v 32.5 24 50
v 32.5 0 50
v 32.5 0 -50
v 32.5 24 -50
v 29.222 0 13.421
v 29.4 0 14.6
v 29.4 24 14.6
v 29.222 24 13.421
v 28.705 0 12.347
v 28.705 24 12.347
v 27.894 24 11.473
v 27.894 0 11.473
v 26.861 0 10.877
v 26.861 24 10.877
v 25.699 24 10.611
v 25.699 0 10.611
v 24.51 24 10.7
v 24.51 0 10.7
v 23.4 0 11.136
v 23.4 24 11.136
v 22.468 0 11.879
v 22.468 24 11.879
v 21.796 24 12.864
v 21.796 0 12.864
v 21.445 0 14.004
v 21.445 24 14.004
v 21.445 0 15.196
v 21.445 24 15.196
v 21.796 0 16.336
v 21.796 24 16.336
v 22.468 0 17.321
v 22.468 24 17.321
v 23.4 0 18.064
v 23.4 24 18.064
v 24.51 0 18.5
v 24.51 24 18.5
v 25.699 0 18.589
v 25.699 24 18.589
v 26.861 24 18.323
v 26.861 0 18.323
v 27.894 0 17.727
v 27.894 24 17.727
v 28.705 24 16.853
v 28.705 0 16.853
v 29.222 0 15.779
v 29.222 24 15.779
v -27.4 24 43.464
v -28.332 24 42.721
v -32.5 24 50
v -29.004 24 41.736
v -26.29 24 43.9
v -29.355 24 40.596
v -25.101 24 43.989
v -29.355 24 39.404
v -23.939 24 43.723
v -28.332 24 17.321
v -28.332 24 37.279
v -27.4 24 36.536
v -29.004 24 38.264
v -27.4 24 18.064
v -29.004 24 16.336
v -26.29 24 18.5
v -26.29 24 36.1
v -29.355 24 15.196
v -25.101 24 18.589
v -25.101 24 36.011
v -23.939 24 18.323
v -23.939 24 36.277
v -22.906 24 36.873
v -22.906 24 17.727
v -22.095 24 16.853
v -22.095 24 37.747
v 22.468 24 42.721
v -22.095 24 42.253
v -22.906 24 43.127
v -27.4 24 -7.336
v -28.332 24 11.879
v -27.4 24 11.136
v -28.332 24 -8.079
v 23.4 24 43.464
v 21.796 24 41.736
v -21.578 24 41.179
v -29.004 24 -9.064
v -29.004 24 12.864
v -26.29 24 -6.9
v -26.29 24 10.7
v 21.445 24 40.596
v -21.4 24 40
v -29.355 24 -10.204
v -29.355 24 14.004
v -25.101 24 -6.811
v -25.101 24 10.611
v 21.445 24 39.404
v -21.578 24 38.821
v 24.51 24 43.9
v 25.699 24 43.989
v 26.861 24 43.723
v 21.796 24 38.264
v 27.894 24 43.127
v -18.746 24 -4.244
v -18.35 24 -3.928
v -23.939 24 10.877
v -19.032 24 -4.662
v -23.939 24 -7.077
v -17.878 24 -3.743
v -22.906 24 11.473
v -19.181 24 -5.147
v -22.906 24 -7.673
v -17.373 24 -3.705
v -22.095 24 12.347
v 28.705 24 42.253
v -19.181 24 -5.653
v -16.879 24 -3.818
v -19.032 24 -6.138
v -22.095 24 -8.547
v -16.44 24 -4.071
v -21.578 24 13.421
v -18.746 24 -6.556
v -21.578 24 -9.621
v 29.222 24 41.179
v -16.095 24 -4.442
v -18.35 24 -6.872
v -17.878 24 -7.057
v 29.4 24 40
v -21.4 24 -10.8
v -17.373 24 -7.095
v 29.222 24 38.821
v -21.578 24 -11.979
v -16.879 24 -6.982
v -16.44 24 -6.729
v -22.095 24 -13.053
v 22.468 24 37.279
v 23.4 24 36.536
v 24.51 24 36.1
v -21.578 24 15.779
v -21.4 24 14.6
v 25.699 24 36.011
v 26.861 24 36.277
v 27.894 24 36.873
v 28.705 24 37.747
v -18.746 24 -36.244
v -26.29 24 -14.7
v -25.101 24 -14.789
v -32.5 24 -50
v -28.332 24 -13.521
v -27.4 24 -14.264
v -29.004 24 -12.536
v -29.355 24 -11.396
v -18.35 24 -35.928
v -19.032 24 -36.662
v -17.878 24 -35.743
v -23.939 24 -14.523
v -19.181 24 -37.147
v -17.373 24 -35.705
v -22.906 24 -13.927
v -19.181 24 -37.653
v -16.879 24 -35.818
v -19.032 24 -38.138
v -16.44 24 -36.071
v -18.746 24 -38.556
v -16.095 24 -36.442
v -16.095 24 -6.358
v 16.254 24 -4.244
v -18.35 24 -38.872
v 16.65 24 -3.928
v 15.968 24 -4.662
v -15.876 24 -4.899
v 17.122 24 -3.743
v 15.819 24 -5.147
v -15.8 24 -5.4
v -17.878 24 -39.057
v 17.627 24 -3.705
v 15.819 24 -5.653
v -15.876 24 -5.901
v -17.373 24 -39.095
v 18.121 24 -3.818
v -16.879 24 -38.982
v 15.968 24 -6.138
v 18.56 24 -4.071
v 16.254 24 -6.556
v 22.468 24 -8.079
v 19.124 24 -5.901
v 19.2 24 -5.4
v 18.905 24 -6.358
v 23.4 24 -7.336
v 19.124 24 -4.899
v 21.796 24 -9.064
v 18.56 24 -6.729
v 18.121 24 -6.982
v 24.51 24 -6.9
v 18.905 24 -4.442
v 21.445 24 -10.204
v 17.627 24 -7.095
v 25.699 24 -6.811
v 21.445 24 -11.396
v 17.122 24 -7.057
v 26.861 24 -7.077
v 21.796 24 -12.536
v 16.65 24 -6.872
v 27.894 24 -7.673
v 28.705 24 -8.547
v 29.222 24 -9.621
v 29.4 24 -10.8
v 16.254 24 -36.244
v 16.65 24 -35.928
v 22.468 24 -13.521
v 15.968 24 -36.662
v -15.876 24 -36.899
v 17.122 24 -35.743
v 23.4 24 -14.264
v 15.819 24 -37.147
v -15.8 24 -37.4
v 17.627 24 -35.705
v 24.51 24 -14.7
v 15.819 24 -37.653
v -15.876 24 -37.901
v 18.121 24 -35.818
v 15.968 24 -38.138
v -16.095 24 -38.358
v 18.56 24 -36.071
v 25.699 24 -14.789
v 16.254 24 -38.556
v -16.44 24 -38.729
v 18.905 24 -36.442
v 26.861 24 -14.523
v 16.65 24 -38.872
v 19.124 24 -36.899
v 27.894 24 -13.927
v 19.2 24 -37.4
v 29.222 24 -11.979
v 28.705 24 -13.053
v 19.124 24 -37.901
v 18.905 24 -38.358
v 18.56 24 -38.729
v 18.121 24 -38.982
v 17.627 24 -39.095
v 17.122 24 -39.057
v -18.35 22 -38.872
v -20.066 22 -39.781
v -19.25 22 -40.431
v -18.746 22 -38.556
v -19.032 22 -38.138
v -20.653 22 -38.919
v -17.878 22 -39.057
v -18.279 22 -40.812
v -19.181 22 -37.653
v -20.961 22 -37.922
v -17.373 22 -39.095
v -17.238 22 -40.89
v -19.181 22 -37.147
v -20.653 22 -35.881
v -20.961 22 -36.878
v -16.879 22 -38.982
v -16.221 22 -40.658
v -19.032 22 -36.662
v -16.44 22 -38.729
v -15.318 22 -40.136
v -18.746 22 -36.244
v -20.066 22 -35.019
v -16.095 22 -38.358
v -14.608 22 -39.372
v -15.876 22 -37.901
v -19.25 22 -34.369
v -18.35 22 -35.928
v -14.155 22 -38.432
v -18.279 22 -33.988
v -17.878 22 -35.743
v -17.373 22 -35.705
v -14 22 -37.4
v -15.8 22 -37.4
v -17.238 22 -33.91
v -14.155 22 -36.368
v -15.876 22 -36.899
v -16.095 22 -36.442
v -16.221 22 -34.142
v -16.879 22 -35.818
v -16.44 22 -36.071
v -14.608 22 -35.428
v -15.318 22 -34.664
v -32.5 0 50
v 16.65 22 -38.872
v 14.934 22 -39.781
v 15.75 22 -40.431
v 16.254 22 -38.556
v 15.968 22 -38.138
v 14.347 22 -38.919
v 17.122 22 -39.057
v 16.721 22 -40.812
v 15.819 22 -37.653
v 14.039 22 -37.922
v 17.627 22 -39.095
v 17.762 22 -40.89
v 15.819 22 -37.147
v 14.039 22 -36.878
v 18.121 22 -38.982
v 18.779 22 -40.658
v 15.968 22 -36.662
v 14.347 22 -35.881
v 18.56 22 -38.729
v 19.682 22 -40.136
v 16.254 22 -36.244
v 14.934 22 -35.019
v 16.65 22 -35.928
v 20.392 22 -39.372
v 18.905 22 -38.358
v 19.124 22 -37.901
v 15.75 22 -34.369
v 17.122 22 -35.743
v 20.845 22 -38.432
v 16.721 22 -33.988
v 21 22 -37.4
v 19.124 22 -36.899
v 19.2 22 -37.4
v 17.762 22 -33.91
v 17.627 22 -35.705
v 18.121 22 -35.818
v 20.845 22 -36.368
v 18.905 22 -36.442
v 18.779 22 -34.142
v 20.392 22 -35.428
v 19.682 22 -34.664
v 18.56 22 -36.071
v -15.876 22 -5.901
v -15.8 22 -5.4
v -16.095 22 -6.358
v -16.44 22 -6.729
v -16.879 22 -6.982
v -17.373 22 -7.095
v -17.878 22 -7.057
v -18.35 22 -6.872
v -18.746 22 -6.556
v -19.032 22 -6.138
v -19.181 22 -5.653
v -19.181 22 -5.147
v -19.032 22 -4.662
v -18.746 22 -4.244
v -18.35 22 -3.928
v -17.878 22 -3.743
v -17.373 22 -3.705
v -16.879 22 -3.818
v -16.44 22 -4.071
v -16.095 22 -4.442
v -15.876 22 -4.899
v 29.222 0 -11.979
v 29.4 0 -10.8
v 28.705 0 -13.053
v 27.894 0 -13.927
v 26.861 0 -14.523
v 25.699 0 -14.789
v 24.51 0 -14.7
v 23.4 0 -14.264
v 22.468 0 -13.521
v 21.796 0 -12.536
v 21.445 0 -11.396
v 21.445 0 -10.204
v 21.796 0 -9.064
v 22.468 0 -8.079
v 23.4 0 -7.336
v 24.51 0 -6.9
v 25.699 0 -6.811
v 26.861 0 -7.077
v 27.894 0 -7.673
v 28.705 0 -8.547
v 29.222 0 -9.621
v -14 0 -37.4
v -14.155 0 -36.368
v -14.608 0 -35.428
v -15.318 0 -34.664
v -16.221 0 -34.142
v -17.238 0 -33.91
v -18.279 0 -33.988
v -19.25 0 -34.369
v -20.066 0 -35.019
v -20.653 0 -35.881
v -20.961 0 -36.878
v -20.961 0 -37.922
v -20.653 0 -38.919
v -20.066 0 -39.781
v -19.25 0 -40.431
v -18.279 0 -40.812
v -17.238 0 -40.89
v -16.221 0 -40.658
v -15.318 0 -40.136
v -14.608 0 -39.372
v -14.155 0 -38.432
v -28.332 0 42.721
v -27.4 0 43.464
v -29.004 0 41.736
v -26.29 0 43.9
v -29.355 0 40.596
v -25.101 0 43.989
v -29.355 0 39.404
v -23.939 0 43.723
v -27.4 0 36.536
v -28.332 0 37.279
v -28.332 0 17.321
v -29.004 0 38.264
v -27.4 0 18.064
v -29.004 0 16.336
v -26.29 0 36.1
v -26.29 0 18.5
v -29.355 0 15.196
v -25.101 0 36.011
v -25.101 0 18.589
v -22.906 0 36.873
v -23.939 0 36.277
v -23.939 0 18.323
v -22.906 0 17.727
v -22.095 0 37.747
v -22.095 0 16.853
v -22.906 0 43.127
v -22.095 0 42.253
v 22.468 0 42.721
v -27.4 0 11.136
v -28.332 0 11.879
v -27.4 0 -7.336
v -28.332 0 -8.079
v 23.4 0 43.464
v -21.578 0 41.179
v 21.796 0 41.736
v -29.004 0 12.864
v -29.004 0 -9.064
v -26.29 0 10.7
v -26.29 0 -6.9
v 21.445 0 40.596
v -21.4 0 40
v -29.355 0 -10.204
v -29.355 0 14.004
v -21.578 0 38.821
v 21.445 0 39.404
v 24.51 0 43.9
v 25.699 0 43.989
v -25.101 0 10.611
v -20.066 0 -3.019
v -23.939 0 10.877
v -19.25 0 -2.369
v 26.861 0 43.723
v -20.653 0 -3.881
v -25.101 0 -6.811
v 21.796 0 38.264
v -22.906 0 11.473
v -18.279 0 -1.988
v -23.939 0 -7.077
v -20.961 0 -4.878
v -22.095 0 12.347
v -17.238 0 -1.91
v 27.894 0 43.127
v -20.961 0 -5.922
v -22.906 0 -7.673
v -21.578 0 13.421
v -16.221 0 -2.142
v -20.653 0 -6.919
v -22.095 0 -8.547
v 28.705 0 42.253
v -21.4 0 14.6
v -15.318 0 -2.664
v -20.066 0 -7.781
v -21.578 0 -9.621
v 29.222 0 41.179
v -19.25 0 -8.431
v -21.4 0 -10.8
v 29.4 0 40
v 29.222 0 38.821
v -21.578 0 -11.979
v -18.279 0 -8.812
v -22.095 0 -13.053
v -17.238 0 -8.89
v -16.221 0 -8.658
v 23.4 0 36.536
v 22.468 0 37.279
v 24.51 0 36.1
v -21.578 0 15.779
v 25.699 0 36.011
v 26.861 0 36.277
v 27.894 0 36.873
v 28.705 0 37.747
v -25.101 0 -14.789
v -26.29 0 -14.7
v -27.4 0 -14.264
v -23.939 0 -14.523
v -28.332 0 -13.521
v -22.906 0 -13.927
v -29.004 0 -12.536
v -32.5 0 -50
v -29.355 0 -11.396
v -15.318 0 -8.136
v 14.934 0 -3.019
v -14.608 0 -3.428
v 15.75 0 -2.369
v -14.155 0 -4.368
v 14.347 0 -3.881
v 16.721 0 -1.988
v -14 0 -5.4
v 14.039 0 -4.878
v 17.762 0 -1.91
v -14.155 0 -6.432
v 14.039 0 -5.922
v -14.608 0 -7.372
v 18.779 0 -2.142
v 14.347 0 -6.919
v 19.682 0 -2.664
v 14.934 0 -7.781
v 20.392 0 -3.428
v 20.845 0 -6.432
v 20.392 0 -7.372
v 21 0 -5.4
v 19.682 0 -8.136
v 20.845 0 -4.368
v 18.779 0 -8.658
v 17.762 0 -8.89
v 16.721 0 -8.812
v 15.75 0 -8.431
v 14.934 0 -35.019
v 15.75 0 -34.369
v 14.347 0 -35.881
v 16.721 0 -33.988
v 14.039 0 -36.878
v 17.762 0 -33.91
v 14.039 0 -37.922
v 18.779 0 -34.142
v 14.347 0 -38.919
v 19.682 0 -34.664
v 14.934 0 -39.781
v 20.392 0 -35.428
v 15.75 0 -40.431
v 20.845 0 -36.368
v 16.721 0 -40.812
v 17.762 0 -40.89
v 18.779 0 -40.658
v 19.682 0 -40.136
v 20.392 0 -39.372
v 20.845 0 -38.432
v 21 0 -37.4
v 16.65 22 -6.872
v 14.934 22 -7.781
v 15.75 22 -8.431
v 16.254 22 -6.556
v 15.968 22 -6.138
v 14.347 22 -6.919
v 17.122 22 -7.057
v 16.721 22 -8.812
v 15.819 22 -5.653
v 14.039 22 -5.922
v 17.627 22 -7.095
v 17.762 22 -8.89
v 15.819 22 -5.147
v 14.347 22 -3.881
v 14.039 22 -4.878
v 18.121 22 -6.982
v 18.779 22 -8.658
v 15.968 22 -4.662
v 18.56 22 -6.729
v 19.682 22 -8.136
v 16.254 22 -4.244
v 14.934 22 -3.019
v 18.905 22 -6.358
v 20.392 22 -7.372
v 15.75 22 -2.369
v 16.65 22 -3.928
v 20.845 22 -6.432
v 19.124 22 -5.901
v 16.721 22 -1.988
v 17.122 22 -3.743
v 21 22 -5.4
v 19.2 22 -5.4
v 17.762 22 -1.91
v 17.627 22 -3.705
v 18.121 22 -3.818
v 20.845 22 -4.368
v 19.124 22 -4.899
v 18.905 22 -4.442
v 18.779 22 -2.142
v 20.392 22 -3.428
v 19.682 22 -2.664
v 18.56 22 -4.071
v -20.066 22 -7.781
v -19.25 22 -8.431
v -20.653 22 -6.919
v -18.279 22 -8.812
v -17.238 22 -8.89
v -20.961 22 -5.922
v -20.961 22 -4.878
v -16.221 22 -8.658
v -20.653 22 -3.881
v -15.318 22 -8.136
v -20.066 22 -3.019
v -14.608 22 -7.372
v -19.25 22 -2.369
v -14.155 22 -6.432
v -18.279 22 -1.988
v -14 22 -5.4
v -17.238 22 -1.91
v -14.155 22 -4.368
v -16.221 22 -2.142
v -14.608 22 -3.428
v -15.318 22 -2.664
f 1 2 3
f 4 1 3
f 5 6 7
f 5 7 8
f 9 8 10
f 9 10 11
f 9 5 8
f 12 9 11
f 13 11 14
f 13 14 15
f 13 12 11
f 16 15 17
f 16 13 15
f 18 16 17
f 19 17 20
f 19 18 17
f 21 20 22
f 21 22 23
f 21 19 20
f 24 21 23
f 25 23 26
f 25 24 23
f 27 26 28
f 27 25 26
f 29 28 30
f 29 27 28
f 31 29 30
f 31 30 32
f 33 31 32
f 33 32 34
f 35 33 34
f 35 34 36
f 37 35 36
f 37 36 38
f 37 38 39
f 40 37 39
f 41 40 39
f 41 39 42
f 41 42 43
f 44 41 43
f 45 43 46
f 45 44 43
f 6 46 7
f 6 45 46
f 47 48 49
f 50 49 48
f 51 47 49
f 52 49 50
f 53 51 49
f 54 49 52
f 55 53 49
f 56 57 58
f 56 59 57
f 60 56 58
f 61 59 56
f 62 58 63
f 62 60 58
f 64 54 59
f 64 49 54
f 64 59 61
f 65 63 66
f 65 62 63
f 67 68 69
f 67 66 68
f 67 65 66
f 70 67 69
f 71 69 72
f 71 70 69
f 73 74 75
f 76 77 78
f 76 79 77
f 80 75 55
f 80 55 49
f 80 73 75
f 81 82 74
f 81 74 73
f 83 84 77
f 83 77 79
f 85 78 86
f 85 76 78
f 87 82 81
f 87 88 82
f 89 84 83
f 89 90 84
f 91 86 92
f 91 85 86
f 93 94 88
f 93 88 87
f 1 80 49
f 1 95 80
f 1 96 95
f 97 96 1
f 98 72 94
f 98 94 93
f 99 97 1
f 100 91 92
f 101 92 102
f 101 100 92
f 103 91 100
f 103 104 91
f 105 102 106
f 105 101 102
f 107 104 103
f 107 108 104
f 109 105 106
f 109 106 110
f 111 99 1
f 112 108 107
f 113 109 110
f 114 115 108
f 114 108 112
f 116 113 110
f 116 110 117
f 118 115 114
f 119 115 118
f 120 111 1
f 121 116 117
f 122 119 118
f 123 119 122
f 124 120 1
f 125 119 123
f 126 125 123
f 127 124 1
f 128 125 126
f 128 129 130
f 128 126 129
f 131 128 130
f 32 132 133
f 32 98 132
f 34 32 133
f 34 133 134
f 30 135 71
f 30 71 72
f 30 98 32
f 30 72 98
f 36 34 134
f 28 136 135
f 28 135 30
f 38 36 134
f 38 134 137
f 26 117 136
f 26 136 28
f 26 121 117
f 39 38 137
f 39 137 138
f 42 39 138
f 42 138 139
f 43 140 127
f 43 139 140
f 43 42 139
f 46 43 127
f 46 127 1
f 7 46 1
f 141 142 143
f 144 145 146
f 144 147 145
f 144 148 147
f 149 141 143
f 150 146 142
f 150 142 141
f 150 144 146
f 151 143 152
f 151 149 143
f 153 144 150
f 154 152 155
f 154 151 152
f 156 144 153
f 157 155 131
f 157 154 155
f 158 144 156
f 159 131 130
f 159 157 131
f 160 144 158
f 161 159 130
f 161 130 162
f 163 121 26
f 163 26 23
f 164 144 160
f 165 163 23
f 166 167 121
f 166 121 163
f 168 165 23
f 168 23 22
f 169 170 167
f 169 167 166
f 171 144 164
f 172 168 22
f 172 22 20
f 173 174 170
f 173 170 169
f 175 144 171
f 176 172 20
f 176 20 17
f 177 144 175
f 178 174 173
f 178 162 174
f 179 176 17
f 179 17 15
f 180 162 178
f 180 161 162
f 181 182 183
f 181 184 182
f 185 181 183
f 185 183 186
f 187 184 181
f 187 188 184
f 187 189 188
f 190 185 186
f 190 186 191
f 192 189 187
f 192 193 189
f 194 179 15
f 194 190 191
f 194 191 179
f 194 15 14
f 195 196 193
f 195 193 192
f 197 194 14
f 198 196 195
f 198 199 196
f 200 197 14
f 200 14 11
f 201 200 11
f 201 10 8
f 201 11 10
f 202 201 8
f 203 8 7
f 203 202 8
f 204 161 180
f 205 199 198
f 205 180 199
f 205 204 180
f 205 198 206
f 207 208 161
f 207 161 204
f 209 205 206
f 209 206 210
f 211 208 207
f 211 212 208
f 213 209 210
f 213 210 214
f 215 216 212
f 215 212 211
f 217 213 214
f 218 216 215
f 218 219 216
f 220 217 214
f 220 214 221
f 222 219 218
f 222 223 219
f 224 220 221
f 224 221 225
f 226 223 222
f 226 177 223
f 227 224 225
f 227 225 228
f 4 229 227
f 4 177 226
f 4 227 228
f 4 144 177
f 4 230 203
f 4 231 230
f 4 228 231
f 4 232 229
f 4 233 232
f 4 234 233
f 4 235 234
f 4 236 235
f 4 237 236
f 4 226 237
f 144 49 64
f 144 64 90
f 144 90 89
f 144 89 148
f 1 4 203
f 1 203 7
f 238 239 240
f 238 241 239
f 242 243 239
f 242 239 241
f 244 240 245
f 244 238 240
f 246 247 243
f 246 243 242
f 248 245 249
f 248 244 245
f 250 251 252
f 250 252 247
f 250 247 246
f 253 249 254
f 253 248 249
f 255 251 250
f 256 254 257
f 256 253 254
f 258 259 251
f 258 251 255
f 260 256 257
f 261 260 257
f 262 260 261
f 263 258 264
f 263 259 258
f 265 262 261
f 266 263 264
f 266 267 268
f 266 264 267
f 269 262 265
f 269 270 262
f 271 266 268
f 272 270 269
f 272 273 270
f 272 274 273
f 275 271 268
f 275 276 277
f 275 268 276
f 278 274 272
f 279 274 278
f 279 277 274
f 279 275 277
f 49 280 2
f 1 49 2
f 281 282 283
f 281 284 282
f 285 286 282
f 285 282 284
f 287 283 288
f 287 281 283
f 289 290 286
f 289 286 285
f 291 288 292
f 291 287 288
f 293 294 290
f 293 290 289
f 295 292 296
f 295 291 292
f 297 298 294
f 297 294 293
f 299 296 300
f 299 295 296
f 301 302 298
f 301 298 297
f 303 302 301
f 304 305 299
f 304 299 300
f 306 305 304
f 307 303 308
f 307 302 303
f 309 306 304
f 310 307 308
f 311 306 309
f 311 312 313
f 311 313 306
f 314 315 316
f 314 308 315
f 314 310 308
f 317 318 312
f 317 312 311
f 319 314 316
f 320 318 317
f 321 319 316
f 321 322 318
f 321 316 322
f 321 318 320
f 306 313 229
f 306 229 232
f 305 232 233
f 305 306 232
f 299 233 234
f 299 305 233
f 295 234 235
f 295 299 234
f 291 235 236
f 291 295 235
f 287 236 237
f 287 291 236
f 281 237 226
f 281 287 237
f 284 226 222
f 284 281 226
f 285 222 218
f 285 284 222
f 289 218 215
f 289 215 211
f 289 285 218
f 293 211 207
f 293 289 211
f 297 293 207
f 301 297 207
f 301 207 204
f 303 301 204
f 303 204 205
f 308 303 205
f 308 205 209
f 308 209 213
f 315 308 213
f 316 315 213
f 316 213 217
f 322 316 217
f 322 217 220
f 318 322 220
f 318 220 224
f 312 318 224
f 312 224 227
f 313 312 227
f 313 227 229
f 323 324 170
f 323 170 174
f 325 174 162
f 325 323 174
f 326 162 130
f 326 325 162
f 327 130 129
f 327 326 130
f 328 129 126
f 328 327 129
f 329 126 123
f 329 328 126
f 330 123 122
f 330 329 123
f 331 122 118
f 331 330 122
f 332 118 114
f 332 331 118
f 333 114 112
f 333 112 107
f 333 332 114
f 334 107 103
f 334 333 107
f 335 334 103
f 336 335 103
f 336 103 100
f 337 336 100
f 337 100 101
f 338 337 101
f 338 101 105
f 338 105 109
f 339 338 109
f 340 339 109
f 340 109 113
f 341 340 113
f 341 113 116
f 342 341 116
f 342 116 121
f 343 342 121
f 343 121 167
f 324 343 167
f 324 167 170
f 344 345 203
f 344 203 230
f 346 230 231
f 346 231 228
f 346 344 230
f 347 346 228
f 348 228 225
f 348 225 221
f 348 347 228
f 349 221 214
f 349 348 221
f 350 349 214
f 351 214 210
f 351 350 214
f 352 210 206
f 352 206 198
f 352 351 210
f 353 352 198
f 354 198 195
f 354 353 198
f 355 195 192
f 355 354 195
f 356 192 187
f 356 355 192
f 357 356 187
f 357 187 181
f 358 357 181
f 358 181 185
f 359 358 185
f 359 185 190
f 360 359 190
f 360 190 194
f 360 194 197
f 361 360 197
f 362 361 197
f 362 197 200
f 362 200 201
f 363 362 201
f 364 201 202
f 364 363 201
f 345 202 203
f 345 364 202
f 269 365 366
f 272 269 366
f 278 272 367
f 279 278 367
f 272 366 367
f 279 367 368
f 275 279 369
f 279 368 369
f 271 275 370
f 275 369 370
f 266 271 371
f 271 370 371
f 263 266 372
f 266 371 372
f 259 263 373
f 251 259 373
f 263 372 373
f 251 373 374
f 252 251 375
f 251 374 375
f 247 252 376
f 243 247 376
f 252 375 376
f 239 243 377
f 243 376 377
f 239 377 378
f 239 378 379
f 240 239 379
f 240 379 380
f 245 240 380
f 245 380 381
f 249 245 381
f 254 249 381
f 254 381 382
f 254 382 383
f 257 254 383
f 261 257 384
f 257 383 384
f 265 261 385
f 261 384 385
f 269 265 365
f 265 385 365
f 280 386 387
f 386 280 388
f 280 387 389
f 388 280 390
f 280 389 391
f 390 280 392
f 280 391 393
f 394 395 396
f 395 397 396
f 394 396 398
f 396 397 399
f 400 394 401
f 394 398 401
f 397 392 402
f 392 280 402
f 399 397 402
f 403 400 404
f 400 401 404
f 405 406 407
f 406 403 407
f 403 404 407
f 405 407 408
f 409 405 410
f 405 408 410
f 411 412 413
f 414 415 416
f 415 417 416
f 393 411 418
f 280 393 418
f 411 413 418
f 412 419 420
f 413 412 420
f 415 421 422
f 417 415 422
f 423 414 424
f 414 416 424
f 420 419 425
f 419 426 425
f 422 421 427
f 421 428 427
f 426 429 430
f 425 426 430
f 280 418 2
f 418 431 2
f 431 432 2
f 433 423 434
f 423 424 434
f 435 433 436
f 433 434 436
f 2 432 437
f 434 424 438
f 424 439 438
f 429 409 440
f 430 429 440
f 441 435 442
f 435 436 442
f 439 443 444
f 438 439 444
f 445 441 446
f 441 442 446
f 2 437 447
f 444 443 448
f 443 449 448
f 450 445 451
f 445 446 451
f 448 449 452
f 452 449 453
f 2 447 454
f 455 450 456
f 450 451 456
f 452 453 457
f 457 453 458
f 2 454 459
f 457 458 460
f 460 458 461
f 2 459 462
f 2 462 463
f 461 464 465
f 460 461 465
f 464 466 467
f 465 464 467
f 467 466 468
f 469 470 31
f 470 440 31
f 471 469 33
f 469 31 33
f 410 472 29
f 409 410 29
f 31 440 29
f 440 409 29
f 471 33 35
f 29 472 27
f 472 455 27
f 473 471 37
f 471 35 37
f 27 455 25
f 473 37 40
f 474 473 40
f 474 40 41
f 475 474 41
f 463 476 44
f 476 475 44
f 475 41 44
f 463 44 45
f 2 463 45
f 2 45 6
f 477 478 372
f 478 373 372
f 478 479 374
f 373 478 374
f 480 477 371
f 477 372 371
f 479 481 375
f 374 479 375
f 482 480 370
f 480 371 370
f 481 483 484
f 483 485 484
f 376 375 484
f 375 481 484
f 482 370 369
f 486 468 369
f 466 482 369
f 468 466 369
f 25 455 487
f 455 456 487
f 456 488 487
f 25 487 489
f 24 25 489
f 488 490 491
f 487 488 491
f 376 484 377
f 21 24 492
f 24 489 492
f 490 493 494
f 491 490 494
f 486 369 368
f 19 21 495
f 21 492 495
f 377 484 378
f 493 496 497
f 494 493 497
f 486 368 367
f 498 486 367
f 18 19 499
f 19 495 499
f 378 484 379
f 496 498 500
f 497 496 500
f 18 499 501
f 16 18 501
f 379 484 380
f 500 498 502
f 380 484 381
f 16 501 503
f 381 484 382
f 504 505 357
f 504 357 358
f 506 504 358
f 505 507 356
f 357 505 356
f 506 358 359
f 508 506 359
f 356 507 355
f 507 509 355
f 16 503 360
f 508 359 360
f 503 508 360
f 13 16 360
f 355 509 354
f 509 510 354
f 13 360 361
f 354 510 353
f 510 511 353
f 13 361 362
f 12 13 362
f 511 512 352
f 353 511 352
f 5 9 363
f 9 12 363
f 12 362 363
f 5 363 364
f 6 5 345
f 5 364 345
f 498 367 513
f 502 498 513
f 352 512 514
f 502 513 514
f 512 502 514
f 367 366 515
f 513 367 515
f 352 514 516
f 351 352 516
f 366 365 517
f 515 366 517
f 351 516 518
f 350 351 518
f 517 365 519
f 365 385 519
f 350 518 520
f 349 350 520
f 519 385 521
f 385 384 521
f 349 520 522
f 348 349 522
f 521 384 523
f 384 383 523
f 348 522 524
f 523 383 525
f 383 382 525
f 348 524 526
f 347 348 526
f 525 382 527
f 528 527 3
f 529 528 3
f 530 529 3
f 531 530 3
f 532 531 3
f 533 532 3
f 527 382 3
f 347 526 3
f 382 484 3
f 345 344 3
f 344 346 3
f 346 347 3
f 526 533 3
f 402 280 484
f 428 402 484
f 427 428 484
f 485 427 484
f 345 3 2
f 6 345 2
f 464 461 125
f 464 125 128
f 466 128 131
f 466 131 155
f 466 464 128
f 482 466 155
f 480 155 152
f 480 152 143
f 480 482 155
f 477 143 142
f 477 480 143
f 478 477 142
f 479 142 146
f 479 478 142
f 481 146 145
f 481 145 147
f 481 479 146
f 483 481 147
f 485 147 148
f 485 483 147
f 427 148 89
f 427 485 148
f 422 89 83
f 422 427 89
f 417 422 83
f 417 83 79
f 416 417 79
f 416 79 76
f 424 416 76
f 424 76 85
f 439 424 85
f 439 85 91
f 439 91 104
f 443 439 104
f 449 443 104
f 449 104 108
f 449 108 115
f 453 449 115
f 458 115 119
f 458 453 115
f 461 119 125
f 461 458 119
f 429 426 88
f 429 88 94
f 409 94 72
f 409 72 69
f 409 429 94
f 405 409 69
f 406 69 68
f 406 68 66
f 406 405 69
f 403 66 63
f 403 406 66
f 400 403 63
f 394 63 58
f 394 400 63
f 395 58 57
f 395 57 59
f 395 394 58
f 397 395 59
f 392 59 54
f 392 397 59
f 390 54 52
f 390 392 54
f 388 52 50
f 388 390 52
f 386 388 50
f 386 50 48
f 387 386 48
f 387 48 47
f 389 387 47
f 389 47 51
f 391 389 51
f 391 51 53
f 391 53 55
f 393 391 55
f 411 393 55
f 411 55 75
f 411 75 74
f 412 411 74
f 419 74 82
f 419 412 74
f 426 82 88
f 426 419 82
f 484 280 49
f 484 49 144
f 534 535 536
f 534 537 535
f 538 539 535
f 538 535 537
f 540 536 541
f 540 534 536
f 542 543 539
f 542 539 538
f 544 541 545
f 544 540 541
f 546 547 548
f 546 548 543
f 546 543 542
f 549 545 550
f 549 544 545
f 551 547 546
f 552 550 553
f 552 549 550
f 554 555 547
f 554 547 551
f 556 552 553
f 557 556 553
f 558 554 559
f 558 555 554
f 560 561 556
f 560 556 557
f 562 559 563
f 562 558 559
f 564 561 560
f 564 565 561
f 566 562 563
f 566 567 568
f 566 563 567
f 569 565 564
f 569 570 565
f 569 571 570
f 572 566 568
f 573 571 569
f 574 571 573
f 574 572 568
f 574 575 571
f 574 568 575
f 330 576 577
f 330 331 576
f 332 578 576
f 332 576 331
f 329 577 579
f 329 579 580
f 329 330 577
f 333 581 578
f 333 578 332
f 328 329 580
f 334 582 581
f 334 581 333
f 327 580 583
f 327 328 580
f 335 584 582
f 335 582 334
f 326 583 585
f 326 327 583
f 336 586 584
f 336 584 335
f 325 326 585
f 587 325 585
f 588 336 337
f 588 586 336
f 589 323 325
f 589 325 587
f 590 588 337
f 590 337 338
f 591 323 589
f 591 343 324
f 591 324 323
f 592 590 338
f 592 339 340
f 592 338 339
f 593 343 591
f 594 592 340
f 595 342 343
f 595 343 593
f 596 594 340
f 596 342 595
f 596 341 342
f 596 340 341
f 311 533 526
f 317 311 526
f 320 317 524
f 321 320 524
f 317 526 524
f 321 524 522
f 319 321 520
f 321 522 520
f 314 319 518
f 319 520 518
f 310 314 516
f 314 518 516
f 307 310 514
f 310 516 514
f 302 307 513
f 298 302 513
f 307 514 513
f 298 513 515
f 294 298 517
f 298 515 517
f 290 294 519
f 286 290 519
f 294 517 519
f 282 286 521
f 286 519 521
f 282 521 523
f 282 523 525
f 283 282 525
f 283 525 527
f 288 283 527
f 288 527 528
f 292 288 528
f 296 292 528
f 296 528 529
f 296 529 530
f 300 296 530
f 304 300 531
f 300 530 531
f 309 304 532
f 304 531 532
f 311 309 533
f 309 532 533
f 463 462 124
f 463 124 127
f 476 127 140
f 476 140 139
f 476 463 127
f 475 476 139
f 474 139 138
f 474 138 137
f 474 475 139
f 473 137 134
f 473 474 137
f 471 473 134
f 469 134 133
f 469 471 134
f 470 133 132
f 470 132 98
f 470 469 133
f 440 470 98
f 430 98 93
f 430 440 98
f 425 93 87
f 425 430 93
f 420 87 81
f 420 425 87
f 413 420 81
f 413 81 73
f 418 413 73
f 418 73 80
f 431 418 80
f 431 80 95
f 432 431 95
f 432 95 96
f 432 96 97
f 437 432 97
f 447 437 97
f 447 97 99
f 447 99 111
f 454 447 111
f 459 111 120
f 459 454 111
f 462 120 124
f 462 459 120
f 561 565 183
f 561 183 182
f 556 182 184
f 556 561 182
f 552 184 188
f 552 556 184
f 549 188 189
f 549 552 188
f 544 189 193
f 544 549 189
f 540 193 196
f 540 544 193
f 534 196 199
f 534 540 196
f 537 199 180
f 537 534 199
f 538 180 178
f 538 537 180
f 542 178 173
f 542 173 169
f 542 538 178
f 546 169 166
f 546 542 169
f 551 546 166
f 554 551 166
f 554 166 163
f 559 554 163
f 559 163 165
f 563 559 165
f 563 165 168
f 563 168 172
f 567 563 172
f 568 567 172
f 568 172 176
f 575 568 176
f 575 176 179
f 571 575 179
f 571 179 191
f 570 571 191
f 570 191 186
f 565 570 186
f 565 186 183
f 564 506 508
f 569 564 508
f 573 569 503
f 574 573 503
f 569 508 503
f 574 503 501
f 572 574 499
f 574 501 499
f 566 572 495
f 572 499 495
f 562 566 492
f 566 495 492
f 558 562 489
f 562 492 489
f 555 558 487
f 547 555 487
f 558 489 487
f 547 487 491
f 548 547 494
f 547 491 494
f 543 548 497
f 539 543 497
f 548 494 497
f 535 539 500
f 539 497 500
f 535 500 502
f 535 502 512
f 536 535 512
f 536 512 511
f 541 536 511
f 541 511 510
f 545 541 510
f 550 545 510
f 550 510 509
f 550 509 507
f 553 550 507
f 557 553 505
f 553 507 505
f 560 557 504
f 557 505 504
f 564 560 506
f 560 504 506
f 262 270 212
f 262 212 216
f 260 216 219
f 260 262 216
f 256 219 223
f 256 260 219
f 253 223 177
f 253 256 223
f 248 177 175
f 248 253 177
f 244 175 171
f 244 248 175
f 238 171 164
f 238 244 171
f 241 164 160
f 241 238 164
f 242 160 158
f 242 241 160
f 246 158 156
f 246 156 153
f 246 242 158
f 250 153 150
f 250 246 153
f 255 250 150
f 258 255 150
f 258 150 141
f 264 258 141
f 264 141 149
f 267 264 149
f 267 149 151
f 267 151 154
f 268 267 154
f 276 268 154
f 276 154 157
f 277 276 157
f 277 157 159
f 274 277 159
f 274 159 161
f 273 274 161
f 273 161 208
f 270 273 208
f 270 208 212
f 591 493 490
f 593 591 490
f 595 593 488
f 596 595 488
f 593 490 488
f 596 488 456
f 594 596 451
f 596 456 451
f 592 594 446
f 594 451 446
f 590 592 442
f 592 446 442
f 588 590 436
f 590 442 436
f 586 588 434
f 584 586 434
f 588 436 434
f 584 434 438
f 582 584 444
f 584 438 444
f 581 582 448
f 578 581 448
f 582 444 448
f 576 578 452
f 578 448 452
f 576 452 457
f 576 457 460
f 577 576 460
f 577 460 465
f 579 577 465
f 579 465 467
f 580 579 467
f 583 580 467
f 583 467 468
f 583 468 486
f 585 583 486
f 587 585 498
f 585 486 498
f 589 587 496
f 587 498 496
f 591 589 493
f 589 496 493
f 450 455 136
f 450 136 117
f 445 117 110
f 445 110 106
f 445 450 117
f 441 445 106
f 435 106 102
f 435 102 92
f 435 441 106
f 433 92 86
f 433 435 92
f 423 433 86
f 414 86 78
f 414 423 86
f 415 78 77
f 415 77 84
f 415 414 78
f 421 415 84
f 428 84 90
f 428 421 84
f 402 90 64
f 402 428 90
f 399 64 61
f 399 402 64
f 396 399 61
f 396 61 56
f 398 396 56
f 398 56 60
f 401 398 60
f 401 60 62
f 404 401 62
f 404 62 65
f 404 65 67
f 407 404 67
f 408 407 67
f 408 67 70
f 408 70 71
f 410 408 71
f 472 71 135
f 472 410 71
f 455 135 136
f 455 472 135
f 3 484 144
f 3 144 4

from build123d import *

# Parameters (mm, degrees)
SKETCH1_W           = 65
SKETCH1_H           = 100
SKETCH1_R           = 4
SKETCH1_R_2         = 1.7
BOSS_EXTRUDE1_DEPTH = 24
SKETCH3_R           = 3.5
CUT_EXTRUDE1_DEPTH  = 22


with BuildPart() as part:
    # Sketch1 → Boss-Extrude1 (new body)
    with BuildSketch(Plane(origin=(0, 0, 0), x_dir=(1, 0, 0), z_dir=(0, 1, 0))):
        Rectangle(SKETCH1_W, SKETCH1_H)
        with Locations((-25.4, -40)):
            Circle(SKETCH1_R, mode=Mode.SUBTRACT)
        with Locations((25.4, -40)):
            Circle(SKETCH1_R, mode=Mode.SUBTRACT)
        with Locations((25.4, -14.6)):
            Circle(SKETCH1_R, mode=Mode.SUBTRACT)
        with Locations((-25.4, -14.6)):
            Circle(SKETCH1_R, mode=Mode.SUBTRACT)
        with Locations((-17.5, 5.4)):
            Circle(SKETCH1_R_2, mode=Mode.SUBTRACT)
        with Locations((17.5, 37.4)):
            Circle(SKETCH1_R_2, mode=Mode.SUBTRACT)
        with Locations((-17.5, 37.4)):
            Circle(SKETCH1_R_2, mode=Mode.SUBTRACT)
        with Locations((17.5, 5.4)):
            Circle(SKETCH1_R_2, mode=Mode.SUBTRACT)
        with Locations((25.4, 10.8)):
            Circle(SKETCH1_R, mode=Mode.SUBTRACT)
        with Locations((-25.4, 10.8)):
            Circle(SKETCH1_R, mode=Mode.SUBTRACT)
    extrude(amount=BOSS_EXTRUDE1_DEPTH)

    # Sketch3 → Cut-Extrude1 (cut)
    with BuildSketch(Plane.XZ):
        with Locations((-17.5, -5.4)):
            Circle(SKETCH3_R)
        with Locations((17.5, -5.4)):
            Circle(SKETCH3_R)
        with Locations((-17.5, -37.4)):
            Circle(SKETCH3_R)
        with Locations((17.5, -37.4)):
            Circle(SKETCH3_R)
    extrude(amount=-CUT_EXTRUDE1_DEPTH, mode=Mode.SUBTRACT)


solid = part.part
